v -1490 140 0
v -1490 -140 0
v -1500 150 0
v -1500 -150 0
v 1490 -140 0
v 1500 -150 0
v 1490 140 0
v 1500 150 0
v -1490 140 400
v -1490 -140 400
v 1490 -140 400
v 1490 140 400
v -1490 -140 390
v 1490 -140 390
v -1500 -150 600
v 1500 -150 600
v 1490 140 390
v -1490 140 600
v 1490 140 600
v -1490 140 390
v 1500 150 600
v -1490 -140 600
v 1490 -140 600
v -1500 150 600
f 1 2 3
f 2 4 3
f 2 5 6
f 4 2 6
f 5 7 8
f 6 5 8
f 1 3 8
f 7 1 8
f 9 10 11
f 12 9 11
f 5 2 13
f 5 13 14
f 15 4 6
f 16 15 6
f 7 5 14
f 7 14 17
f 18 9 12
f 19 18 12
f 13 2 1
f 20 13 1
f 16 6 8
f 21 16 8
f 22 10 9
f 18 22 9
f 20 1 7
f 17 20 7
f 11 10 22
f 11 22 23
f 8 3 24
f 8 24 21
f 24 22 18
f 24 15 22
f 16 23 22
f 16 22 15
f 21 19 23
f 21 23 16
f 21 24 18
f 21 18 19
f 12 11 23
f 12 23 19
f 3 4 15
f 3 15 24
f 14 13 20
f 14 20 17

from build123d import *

# Parameters (mm, degrees)
F0_W     = 3000
F0_H     = 300
F1_DEPTH = 600
F2_T     = -10
F4_W     = 2980
F4_H     = 280
F5_DEPTH = 10


with BuildPart() as f1:
    # F0 (on Top) → F1 (new body)
    with BuildSketch(Plane.XY):
        Rectangle(F0_W, F0_H)
    extrude(amount=F1_DEPTH)

    # F2
    f2_openings = [f1.faces().sort_by_distance(p)[0] for p in [
        (0, 0, 600),
        (0, 0, 0),
    ]]
    offset(amount=F2_T, openings=f2_openings)

    # F4 (on offset) → F5 (join)
    with BuildSketch(Plane(origin=(0, 0, 400), x_dir=(1, 0, 0), z_dir=(0, 0, -1))):
        Rectangle(F4_W, F4_H)
    extrude(amount=F5_DEPTH)


solid = f1.part
